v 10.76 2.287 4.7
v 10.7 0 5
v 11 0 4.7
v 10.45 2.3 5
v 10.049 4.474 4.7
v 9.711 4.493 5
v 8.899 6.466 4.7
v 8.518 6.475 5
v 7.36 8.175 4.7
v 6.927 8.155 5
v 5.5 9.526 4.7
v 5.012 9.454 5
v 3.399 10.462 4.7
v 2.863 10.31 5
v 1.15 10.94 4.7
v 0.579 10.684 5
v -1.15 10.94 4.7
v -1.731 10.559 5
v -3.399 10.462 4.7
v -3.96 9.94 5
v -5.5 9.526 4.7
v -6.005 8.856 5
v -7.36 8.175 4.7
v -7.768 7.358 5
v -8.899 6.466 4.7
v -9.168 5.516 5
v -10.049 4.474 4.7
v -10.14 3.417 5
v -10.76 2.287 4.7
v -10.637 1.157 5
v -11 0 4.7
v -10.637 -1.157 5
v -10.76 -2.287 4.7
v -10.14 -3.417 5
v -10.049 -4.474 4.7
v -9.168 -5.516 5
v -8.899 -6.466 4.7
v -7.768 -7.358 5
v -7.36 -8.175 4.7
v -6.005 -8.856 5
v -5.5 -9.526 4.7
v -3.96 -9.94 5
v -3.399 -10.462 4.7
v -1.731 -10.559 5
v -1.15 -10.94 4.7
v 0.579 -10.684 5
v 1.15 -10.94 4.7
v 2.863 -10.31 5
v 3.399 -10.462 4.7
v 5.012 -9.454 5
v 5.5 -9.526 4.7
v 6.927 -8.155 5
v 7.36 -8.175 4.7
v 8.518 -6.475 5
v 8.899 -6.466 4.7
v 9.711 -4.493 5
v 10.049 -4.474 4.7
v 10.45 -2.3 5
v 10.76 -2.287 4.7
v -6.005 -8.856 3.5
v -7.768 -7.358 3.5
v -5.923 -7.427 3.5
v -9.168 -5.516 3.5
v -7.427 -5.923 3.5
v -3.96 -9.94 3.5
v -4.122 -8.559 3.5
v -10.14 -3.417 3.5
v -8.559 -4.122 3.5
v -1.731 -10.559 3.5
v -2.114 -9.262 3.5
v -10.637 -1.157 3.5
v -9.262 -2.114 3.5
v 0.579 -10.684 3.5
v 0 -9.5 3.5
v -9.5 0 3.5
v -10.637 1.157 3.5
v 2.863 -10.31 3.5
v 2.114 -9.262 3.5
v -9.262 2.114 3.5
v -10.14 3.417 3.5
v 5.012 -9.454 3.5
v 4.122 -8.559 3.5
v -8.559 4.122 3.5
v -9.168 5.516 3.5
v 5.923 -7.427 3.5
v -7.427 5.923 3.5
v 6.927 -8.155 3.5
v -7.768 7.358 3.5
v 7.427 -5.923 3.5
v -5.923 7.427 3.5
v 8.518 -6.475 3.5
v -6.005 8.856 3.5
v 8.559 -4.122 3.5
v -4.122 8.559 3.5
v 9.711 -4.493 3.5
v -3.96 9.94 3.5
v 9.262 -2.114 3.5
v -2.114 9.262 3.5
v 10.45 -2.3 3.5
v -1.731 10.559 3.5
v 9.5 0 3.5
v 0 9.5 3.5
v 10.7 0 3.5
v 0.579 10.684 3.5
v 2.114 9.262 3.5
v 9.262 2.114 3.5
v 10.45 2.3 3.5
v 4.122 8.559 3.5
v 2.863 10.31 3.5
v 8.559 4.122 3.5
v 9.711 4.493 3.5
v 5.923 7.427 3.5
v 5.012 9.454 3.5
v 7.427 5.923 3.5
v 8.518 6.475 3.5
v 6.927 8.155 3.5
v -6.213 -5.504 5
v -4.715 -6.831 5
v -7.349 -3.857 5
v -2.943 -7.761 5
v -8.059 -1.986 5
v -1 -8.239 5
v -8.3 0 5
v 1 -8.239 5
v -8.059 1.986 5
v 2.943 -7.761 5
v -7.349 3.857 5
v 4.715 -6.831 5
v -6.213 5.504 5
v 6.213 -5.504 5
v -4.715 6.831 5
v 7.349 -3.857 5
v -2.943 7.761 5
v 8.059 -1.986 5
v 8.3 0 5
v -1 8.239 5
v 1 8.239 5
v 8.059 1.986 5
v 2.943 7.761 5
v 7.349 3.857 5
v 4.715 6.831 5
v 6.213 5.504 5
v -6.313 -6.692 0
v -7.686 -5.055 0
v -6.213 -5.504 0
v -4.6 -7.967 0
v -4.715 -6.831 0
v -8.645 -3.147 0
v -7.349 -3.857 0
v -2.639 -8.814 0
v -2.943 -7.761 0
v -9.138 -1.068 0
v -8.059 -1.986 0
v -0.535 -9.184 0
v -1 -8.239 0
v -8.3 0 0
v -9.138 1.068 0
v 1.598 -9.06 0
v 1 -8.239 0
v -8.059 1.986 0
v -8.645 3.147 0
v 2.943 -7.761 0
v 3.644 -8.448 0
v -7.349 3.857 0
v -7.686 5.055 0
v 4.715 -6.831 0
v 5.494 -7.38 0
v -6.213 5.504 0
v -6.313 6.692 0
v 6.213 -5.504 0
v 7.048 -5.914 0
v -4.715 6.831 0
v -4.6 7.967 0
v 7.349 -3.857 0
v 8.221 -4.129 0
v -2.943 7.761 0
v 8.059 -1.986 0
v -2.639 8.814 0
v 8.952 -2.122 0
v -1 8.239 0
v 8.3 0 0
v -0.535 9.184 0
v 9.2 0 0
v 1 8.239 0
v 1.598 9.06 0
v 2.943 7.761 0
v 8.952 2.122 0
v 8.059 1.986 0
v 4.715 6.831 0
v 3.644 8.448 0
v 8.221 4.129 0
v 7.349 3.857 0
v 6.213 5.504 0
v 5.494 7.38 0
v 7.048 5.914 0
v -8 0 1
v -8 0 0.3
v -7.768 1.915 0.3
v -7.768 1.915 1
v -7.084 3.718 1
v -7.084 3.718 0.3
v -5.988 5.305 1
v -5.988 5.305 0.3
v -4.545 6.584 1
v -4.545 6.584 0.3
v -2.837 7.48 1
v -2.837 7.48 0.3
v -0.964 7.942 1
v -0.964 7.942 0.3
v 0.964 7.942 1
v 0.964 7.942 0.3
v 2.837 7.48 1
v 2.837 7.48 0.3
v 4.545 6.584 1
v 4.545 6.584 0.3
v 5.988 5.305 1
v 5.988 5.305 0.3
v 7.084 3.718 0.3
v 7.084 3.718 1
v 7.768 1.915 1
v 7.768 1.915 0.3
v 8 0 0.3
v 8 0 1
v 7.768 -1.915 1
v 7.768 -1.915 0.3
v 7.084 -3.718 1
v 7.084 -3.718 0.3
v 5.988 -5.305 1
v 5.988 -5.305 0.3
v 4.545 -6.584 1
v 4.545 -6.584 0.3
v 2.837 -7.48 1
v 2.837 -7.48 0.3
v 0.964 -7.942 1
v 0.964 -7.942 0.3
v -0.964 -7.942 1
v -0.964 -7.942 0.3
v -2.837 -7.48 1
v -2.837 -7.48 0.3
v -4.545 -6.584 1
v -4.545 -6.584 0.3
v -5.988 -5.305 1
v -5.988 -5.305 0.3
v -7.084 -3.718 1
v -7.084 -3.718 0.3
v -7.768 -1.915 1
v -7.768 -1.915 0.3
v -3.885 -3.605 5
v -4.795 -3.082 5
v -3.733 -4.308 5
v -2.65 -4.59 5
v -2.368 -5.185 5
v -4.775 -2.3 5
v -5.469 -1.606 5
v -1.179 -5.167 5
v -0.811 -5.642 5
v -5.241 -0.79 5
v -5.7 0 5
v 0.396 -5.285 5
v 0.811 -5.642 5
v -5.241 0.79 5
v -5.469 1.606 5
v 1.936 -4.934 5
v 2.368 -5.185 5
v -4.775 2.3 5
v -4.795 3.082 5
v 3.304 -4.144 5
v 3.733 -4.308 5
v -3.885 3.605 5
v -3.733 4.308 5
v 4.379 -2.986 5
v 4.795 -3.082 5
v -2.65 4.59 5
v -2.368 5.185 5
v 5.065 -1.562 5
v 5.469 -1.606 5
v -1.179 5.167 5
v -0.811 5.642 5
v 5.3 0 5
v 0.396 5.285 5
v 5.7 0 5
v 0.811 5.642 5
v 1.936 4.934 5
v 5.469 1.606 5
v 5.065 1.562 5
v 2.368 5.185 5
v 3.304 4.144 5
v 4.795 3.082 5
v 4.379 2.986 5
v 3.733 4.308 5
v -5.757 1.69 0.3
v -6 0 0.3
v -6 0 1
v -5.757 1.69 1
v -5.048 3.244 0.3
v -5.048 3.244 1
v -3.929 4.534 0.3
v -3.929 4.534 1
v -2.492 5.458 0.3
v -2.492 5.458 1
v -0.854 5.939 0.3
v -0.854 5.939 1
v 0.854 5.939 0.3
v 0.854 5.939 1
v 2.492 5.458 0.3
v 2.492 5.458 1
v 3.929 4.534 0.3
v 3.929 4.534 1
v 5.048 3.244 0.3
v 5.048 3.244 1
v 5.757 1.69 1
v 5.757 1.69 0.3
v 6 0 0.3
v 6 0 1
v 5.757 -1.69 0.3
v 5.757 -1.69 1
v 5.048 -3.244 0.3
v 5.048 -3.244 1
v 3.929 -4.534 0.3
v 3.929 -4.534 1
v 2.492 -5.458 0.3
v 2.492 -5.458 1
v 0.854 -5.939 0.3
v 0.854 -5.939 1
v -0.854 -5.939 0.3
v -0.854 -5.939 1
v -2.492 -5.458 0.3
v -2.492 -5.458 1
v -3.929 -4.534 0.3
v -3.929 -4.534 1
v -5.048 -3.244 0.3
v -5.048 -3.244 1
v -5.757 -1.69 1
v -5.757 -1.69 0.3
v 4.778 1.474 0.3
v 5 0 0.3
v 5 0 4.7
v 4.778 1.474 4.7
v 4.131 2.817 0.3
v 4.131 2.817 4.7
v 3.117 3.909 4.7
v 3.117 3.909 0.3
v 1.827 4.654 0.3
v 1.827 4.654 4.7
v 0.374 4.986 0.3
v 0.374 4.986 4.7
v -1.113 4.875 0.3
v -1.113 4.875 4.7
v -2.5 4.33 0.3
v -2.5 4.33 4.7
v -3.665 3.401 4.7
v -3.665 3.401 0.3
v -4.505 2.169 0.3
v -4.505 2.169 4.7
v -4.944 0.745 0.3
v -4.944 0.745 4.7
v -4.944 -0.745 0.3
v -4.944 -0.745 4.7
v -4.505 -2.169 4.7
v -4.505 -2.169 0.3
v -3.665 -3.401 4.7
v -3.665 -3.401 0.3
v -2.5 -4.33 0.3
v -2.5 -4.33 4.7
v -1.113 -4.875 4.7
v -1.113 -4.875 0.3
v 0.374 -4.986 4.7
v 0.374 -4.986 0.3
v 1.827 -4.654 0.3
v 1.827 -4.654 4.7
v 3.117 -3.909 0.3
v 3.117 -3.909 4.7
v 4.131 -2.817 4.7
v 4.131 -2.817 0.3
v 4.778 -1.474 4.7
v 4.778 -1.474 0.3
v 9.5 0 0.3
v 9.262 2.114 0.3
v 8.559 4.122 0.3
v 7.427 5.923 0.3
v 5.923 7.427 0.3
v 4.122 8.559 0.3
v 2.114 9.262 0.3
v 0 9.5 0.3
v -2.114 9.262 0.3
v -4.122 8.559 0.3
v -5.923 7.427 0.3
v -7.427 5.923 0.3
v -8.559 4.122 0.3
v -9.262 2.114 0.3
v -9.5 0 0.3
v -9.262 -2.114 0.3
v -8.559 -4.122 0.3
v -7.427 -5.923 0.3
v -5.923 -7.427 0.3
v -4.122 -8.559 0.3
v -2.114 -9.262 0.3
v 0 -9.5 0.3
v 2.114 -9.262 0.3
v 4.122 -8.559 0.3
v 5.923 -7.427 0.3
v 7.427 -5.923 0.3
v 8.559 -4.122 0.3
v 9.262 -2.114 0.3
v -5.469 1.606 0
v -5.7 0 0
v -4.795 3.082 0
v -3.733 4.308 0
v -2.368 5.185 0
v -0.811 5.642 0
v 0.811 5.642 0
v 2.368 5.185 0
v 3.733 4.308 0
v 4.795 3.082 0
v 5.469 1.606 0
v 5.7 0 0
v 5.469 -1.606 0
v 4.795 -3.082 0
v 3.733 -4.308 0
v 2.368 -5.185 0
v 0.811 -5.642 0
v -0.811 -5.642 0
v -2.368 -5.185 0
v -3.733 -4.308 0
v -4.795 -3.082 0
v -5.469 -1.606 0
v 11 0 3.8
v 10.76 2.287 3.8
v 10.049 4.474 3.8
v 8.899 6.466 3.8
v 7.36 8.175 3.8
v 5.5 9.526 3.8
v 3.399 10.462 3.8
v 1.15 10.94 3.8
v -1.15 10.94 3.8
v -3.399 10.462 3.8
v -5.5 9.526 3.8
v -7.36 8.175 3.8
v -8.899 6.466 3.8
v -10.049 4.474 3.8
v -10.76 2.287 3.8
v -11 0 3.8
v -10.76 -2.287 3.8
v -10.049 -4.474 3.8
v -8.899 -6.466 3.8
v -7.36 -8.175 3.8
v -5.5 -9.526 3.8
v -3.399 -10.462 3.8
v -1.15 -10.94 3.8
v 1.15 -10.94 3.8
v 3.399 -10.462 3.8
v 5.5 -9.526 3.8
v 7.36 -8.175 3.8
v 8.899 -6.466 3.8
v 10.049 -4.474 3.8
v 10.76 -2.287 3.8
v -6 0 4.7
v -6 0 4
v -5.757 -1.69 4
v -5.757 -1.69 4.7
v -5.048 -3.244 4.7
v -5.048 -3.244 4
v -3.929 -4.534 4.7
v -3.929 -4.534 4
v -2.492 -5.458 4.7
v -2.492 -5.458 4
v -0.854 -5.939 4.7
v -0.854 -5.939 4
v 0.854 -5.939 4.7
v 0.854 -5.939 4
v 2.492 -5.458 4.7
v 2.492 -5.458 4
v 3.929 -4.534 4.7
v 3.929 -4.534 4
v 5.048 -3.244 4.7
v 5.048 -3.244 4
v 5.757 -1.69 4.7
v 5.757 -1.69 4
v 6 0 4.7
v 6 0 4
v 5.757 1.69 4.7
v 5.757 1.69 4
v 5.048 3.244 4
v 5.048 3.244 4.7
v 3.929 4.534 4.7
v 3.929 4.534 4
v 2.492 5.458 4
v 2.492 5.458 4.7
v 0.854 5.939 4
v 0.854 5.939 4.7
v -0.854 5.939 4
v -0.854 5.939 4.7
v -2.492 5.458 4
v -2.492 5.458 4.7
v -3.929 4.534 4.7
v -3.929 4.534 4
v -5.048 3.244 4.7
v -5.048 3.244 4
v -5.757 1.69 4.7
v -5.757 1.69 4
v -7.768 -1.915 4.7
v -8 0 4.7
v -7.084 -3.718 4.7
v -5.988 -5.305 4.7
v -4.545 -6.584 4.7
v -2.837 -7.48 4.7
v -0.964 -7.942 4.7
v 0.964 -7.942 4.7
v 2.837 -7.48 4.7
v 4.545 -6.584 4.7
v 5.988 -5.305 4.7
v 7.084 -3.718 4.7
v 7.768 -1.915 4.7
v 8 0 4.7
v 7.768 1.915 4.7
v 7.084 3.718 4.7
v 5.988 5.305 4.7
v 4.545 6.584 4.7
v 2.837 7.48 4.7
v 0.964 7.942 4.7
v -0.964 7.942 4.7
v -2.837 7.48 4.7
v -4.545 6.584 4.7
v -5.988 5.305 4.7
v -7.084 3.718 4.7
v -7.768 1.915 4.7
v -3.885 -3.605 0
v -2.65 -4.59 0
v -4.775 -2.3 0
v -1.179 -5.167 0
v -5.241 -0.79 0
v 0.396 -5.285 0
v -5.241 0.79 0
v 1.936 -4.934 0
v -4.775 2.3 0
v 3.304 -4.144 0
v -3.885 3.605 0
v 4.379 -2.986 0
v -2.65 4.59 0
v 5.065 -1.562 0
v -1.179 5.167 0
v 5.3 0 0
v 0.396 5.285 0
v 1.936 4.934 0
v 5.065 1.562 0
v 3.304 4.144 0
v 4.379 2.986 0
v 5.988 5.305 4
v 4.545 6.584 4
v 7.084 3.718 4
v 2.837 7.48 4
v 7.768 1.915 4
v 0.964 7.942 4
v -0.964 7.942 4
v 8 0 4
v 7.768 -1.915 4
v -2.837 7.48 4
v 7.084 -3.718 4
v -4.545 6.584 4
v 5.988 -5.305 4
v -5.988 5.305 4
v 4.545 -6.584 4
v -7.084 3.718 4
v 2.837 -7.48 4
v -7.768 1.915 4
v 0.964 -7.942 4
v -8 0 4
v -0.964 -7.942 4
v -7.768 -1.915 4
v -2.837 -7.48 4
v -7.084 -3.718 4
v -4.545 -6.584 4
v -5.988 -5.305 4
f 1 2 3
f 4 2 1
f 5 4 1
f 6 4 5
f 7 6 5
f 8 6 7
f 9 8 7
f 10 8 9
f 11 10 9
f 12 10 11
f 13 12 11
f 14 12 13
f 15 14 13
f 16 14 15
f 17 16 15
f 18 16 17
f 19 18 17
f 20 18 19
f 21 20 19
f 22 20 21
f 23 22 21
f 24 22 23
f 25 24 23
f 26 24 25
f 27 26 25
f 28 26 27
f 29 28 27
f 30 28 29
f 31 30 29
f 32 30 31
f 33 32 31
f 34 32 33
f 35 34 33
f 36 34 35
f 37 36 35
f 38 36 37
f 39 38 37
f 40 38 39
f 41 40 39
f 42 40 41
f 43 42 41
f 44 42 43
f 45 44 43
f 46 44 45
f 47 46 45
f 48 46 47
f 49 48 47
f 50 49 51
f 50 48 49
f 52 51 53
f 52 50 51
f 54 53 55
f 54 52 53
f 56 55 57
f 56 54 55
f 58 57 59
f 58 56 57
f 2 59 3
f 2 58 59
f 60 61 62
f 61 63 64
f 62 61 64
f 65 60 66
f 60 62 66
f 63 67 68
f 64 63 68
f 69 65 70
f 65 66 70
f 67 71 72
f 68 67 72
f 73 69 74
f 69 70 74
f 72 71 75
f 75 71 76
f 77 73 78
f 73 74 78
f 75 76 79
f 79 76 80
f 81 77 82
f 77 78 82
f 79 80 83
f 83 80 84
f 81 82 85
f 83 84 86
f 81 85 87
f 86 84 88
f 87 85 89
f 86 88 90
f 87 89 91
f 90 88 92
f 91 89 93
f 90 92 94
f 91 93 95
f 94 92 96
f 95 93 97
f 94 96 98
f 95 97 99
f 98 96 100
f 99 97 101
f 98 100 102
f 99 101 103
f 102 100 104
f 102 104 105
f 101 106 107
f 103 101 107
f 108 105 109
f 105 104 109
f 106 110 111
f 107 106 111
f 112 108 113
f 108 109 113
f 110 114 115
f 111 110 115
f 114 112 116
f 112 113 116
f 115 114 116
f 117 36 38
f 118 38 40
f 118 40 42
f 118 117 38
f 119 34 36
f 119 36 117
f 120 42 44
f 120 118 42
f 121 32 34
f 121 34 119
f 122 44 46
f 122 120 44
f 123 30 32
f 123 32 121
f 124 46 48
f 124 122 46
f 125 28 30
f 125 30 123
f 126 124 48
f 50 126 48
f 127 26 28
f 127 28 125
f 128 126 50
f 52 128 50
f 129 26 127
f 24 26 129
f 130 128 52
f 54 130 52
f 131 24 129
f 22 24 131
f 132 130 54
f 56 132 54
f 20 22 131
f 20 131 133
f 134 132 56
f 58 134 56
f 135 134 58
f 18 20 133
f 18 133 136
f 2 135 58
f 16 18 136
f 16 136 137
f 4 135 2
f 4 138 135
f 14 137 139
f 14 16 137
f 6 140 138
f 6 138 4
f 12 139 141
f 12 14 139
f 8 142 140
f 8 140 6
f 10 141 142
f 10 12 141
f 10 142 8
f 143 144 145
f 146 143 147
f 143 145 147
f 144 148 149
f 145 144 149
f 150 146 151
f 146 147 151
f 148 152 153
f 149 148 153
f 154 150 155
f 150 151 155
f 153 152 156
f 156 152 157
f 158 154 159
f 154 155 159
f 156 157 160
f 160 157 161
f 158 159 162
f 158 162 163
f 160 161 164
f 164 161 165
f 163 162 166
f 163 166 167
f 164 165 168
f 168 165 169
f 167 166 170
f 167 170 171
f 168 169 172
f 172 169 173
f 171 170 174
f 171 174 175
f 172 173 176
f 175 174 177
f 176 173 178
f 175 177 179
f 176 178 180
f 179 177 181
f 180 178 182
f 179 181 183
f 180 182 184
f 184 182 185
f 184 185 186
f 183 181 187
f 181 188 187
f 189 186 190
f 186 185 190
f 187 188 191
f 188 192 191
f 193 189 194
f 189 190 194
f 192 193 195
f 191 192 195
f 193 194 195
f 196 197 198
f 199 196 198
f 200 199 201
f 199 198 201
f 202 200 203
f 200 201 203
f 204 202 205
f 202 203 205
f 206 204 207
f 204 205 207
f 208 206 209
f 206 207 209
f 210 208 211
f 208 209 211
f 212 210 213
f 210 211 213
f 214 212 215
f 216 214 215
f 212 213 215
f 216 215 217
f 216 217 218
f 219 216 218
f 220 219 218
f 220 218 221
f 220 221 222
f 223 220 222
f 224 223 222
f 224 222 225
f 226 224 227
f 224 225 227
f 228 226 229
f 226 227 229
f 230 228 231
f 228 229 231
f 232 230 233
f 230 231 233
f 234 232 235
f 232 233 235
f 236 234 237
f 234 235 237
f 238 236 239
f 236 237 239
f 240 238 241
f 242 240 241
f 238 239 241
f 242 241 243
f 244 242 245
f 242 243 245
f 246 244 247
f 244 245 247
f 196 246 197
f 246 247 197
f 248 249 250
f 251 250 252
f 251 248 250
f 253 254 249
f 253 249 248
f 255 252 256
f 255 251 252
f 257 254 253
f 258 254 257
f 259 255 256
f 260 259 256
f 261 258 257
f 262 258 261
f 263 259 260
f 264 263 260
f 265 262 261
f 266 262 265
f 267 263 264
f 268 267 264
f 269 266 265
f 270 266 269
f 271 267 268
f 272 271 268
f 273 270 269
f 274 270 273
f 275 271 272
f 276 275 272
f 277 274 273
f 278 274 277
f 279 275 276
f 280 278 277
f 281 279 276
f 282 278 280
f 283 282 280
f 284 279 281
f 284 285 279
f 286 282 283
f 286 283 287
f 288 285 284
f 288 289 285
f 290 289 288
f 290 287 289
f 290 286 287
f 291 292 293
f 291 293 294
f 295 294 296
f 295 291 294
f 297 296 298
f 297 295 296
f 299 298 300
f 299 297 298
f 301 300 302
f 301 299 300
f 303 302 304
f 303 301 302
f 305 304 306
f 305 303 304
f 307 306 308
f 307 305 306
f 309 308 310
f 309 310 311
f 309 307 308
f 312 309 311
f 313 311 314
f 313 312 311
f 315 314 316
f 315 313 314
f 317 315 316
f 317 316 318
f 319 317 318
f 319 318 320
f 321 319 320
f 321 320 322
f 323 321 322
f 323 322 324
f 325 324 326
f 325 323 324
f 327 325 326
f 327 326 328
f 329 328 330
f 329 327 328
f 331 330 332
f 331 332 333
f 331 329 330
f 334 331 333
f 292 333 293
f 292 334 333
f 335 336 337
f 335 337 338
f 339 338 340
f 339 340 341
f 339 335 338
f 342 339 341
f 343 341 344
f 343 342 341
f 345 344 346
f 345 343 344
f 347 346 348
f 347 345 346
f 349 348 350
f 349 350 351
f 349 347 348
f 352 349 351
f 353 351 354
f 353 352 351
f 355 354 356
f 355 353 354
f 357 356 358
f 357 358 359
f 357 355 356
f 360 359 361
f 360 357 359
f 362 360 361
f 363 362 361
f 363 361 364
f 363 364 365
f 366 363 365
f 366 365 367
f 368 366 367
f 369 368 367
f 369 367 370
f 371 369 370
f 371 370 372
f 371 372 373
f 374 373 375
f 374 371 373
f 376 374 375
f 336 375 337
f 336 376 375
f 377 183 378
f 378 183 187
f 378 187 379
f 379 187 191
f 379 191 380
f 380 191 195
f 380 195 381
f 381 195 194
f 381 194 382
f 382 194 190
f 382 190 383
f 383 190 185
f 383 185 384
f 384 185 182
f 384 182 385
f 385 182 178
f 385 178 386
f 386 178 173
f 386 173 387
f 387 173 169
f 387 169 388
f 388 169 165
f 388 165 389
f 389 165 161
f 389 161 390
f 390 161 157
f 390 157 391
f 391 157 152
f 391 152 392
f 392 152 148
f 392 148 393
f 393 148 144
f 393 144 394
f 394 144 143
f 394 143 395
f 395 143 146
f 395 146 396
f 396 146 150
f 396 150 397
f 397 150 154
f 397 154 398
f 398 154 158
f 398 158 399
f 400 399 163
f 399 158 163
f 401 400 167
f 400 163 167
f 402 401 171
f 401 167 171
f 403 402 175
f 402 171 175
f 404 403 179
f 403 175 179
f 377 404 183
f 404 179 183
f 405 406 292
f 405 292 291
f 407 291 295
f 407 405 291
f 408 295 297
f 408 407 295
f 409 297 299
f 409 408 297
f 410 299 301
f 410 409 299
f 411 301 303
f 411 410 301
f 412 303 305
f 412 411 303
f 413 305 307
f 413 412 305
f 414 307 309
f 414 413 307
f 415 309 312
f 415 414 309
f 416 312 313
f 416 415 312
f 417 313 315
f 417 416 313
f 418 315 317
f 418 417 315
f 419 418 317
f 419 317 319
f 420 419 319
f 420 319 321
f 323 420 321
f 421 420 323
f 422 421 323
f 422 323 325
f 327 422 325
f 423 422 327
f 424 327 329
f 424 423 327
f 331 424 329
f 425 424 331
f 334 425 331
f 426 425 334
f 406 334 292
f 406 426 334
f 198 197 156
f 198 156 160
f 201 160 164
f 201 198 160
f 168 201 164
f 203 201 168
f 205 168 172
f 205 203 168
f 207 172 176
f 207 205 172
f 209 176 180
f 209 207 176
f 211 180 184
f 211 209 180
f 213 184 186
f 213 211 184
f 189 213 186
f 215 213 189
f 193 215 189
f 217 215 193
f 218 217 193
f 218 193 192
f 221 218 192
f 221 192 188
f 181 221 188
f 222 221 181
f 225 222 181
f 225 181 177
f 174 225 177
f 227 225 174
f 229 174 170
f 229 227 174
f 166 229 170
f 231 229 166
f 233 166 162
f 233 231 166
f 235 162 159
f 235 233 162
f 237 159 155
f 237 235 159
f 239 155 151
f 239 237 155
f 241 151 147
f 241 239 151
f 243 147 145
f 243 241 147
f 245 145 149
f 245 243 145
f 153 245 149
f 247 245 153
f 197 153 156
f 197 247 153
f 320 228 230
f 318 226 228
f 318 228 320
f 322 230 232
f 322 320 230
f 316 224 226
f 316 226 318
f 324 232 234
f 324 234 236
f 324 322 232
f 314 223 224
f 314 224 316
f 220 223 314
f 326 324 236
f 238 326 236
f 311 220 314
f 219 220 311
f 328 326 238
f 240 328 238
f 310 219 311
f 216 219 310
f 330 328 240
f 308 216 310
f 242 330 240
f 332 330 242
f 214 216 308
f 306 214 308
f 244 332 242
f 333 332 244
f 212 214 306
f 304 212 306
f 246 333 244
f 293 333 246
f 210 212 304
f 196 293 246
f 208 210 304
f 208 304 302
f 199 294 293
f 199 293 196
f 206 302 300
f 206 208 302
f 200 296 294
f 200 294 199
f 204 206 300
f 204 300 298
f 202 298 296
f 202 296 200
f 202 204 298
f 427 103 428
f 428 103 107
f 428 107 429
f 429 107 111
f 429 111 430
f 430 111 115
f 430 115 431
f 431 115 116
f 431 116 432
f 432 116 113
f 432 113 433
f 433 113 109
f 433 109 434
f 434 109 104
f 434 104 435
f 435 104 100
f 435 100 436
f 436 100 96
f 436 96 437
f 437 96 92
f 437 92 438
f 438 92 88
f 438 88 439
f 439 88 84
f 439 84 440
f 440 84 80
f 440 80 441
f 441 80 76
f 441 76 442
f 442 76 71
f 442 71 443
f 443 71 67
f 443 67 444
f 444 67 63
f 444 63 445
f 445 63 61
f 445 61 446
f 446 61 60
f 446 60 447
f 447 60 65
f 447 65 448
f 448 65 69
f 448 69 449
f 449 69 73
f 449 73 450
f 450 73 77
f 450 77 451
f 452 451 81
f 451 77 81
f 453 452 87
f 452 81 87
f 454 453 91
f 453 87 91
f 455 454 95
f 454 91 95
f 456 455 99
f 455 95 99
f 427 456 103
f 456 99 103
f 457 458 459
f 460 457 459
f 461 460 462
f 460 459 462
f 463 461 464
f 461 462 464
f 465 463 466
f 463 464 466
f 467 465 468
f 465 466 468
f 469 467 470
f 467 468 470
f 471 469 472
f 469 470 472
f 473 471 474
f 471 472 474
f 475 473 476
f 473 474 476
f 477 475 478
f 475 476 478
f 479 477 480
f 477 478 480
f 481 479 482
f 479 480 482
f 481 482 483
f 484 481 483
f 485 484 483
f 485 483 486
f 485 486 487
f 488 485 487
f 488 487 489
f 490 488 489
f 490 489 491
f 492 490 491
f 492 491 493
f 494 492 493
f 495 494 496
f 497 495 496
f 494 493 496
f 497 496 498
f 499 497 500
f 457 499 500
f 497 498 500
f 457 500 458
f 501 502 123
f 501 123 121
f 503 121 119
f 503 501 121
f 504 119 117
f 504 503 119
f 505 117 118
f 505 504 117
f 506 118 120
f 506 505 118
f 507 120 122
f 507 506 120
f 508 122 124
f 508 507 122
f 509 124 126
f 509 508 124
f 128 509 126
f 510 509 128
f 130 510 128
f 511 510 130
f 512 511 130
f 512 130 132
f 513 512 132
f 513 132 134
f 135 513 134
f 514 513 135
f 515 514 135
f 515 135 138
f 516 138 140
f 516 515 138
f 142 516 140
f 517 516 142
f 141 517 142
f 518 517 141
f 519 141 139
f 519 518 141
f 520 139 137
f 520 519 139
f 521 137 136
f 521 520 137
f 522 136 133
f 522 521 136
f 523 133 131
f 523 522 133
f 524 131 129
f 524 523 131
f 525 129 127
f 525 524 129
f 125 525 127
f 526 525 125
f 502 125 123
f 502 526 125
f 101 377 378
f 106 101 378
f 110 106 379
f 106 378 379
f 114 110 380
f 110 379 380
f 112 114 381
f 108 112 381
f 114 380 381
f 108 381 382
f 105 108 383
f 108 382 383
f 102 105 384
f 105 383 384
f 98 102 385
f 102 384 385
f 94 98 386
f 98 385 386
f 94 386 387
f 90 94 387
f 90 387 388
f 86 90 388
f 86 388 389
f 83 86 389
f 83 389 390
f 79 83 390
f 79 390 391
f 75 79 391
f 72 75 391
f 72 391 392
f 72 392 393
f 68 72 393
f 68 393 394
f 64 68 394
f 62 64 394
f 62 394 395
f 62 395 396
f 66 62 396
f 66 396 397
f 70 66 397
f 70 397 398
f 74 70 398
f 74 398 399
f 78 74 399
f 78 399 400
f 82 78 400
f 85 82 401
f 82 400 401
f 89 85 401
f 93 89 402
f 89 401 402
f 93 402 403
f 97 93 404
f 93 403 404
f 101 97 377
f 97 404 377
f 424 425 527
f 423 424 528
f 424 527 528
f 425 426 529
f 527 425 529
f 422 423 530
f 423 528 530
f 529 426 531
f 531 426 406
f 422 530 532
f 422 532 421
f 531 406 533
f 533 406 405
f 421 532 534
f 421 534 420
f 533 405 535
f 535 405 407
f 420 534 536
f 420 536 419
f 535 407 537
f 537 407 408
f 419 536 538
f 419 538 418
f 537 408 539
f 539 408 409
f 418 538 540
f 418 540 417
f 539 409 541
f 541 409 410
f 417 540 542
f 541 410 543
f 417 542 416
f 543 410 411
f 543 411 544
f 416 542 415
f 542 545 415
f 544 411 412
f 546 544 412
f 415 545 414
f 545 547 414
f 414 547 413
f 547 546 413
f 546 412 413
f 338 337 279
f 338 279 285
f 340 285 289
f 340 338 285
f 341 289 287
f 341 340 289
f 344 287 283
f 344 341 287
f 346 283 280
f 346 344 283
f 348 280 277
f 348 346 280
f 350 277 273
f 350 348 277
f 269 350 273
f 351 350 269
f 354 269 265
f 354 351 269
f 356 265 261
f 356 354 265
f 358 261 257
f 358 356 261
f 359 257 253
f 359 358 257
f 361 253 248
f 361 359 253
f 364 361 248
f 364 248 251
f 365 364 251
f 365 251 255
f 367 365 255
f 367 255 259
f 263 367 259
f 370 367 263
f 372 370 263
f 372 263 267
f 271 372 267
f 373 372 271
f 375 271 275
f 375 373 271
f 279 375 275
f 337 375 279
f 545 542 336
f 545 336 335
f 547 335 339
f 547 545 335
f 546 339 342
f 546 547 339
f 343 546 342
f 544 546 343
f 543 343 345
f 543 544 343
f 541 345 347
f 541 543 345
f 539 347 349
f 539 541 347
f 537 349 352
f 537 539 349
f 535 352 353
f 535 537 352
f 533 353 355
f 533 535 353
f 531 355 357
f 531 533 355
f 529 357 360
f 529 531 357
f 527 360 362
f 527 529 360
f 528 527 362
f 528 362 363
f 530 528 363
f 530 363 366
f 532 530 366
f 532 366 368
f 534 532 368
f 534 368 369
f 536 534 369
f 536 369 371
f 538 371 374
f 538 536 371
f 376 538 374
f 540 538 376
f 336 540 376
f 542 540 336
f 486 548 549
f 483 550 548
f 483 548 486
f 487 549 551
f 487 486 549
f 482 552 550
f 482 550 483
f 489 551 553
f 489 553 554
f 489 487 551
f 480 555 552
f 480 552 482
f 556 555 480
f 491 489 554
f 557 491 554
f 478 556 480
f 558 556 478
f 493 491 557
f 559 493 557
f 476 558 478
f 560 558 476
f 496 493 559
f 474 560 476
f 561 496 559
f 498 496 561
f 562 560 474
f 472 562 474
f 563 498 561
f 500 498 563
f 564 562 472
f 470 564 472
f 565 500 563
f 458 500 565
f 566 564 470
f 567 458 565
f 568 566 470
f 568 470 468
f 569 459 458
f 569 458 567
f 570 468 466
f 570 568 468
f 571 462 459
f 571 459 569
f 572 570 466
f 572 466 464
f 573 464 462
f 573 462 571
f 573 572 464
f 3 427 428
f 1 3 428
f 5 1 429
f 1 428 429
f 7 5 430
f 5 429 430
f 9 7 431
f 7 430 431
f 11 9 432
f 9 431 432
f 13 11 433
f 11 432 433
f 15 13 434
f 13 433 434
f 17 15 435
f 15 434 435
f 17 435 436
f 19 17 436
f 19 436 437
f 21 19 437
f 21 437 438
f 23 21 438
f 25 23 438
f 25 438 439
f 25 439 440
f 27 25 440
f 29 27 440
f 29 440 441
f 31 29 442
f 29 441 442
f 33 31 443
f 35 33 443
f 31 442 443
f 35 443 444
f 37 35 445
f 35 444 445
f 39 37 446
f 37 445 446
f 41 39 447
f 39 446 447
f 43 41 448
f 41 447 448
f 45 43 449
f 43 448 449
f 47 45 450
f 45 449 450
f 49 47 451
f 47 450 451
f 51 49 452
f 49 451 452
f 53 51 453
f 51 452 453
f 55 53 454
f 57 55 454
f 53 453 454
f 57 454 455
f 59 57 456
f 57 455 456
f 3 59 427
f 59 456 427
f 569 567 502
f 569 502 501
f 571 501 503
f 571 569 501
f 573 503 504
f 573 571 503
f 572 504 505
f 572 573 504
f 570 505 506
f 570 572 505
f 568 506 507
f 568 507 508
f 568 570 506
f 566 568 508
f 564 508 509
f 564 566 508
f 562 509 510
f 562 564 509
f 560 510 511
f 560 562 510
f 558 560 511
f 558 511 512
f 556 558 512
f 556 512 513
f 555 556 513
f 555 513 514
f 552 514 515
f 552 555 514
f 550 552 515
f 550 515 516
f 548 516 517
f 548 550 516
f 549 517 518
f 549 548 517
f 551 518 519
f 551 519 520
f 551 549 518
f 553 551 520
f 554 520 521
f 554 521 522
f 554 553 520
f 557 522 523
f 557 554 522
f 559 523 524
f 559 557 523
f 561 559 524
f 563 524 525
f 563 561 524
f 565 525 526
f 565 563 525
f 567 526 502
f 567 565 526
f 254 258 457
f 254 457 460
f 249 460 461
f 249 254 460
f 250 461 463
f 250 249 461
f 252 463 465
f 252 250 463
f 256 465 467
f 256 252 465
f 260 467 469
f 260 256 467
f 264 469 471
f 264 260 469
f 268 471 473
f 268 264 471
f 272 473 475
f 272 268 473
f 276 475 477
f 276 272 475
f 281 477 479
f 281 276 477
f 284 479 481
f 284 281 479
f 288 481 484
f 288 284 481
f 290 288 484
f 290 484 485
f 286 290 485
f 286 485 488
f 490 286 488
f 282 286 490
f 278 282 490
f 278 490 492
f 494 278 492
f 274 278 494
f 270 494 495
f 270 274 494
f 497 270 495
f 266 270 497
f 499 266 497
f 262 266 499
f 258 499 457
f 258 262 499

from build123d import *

# Parameters (mm, degrees)
SKETCH_1_R          = 9.5
SKETCH_1_R_2        = 5
EXTRUDE_1_DEPTH     = 5
EXTRUDE_START       = -1.5
SKETCH_2_R          = 11
SKETCH_2_R_2        = 9.5
EXTRUDE_2_DEPTH     = 1.5
SKETCH_3_R          = 8
SKETCH_3_R_2        = 6
CUT_EXTRUDE_1_DEPTH = 1
CUT_EXTRUDE_START   = -1
SKETCH_4_R          = 8
SKETCH_4_R_2        = 6
CUT_EXTRUDE_2_DEPTH = 1
CHAMFER_1_SIZE      = 0.3


with BuildPart() as part:
    # Эскиз1 → Бобышка-Вытянуть1 (new body)
    with BuildSketch(Plane.XY):
        Circle(SKETCH_1_R)
        Circle(SKETCH_1_R_2, mode=Mode.SUBTRACT)
    extrude(amount=EXTRUDE_1_DEPTH)

    # Эскиз2 → Бобышка-Вытянуть2 (add)
    with BuildSketch(Plane.XY.offset(5).offset(EXTRUDE_START)):
        Circle(SKETCH_2_R)
        Circle(SKETCH_2_R_2, mode=Mode.SUBTRACT)
    extrude(amount=EXTRUDE_2_DEPTH)

    # Эскиз3 → Вырез-Вытянуть1 (cut)
    with BuildSketch(Plane(origin=(0, 0, 0), x_dir=(-1, 0, 0), z_dir=(0, 0, -1))):
        Circle(SKETCH_3_R)
        Circle(SKETCH_3_R_2, mode=Mode.SUBTRACT)
    extrude(amount=-CUT_EXTRUDE_1_DEPTH, mode=Mode.SUBTRACT)

    # Эскиз4 → Вырез-Вытянуть2 (cut)
    with BuildSketch(Plane.XY.offset(5).offset(CUT_EXTRUDE_START)):
        with Locations(Location((0, 0, 0), (0, 0, 180))):
            Circle(SKETCH_4_R)
        with Locations(Location((0, 0, 0), (0, 0, 180))):
            Circle(SKETCH_4_R_2, mode=Mode.SUBTRACT)
    extrude(amount=CUT_EXTRUDE_2_DEPTH, mode=Mode.SUBTRACT)

    # Фаска1
    chamfer_1_edges = [part.edges().sort_by_distance(p)[0] for p in [
        (-11, 0, 3.5),
        (-11, 0, 5),
        (8, 0, 0),
        (6, 0, 0),
        (-9.5, 0, 0),
        (8, 0, 5),
        (6, 0, 5),
        (-5, 0, 0),
        (-5, 0, 5),
    ]]
    chamfer(chamfer_1_edges, length=CHAMFER_1_SIZE)


solid = part.part
